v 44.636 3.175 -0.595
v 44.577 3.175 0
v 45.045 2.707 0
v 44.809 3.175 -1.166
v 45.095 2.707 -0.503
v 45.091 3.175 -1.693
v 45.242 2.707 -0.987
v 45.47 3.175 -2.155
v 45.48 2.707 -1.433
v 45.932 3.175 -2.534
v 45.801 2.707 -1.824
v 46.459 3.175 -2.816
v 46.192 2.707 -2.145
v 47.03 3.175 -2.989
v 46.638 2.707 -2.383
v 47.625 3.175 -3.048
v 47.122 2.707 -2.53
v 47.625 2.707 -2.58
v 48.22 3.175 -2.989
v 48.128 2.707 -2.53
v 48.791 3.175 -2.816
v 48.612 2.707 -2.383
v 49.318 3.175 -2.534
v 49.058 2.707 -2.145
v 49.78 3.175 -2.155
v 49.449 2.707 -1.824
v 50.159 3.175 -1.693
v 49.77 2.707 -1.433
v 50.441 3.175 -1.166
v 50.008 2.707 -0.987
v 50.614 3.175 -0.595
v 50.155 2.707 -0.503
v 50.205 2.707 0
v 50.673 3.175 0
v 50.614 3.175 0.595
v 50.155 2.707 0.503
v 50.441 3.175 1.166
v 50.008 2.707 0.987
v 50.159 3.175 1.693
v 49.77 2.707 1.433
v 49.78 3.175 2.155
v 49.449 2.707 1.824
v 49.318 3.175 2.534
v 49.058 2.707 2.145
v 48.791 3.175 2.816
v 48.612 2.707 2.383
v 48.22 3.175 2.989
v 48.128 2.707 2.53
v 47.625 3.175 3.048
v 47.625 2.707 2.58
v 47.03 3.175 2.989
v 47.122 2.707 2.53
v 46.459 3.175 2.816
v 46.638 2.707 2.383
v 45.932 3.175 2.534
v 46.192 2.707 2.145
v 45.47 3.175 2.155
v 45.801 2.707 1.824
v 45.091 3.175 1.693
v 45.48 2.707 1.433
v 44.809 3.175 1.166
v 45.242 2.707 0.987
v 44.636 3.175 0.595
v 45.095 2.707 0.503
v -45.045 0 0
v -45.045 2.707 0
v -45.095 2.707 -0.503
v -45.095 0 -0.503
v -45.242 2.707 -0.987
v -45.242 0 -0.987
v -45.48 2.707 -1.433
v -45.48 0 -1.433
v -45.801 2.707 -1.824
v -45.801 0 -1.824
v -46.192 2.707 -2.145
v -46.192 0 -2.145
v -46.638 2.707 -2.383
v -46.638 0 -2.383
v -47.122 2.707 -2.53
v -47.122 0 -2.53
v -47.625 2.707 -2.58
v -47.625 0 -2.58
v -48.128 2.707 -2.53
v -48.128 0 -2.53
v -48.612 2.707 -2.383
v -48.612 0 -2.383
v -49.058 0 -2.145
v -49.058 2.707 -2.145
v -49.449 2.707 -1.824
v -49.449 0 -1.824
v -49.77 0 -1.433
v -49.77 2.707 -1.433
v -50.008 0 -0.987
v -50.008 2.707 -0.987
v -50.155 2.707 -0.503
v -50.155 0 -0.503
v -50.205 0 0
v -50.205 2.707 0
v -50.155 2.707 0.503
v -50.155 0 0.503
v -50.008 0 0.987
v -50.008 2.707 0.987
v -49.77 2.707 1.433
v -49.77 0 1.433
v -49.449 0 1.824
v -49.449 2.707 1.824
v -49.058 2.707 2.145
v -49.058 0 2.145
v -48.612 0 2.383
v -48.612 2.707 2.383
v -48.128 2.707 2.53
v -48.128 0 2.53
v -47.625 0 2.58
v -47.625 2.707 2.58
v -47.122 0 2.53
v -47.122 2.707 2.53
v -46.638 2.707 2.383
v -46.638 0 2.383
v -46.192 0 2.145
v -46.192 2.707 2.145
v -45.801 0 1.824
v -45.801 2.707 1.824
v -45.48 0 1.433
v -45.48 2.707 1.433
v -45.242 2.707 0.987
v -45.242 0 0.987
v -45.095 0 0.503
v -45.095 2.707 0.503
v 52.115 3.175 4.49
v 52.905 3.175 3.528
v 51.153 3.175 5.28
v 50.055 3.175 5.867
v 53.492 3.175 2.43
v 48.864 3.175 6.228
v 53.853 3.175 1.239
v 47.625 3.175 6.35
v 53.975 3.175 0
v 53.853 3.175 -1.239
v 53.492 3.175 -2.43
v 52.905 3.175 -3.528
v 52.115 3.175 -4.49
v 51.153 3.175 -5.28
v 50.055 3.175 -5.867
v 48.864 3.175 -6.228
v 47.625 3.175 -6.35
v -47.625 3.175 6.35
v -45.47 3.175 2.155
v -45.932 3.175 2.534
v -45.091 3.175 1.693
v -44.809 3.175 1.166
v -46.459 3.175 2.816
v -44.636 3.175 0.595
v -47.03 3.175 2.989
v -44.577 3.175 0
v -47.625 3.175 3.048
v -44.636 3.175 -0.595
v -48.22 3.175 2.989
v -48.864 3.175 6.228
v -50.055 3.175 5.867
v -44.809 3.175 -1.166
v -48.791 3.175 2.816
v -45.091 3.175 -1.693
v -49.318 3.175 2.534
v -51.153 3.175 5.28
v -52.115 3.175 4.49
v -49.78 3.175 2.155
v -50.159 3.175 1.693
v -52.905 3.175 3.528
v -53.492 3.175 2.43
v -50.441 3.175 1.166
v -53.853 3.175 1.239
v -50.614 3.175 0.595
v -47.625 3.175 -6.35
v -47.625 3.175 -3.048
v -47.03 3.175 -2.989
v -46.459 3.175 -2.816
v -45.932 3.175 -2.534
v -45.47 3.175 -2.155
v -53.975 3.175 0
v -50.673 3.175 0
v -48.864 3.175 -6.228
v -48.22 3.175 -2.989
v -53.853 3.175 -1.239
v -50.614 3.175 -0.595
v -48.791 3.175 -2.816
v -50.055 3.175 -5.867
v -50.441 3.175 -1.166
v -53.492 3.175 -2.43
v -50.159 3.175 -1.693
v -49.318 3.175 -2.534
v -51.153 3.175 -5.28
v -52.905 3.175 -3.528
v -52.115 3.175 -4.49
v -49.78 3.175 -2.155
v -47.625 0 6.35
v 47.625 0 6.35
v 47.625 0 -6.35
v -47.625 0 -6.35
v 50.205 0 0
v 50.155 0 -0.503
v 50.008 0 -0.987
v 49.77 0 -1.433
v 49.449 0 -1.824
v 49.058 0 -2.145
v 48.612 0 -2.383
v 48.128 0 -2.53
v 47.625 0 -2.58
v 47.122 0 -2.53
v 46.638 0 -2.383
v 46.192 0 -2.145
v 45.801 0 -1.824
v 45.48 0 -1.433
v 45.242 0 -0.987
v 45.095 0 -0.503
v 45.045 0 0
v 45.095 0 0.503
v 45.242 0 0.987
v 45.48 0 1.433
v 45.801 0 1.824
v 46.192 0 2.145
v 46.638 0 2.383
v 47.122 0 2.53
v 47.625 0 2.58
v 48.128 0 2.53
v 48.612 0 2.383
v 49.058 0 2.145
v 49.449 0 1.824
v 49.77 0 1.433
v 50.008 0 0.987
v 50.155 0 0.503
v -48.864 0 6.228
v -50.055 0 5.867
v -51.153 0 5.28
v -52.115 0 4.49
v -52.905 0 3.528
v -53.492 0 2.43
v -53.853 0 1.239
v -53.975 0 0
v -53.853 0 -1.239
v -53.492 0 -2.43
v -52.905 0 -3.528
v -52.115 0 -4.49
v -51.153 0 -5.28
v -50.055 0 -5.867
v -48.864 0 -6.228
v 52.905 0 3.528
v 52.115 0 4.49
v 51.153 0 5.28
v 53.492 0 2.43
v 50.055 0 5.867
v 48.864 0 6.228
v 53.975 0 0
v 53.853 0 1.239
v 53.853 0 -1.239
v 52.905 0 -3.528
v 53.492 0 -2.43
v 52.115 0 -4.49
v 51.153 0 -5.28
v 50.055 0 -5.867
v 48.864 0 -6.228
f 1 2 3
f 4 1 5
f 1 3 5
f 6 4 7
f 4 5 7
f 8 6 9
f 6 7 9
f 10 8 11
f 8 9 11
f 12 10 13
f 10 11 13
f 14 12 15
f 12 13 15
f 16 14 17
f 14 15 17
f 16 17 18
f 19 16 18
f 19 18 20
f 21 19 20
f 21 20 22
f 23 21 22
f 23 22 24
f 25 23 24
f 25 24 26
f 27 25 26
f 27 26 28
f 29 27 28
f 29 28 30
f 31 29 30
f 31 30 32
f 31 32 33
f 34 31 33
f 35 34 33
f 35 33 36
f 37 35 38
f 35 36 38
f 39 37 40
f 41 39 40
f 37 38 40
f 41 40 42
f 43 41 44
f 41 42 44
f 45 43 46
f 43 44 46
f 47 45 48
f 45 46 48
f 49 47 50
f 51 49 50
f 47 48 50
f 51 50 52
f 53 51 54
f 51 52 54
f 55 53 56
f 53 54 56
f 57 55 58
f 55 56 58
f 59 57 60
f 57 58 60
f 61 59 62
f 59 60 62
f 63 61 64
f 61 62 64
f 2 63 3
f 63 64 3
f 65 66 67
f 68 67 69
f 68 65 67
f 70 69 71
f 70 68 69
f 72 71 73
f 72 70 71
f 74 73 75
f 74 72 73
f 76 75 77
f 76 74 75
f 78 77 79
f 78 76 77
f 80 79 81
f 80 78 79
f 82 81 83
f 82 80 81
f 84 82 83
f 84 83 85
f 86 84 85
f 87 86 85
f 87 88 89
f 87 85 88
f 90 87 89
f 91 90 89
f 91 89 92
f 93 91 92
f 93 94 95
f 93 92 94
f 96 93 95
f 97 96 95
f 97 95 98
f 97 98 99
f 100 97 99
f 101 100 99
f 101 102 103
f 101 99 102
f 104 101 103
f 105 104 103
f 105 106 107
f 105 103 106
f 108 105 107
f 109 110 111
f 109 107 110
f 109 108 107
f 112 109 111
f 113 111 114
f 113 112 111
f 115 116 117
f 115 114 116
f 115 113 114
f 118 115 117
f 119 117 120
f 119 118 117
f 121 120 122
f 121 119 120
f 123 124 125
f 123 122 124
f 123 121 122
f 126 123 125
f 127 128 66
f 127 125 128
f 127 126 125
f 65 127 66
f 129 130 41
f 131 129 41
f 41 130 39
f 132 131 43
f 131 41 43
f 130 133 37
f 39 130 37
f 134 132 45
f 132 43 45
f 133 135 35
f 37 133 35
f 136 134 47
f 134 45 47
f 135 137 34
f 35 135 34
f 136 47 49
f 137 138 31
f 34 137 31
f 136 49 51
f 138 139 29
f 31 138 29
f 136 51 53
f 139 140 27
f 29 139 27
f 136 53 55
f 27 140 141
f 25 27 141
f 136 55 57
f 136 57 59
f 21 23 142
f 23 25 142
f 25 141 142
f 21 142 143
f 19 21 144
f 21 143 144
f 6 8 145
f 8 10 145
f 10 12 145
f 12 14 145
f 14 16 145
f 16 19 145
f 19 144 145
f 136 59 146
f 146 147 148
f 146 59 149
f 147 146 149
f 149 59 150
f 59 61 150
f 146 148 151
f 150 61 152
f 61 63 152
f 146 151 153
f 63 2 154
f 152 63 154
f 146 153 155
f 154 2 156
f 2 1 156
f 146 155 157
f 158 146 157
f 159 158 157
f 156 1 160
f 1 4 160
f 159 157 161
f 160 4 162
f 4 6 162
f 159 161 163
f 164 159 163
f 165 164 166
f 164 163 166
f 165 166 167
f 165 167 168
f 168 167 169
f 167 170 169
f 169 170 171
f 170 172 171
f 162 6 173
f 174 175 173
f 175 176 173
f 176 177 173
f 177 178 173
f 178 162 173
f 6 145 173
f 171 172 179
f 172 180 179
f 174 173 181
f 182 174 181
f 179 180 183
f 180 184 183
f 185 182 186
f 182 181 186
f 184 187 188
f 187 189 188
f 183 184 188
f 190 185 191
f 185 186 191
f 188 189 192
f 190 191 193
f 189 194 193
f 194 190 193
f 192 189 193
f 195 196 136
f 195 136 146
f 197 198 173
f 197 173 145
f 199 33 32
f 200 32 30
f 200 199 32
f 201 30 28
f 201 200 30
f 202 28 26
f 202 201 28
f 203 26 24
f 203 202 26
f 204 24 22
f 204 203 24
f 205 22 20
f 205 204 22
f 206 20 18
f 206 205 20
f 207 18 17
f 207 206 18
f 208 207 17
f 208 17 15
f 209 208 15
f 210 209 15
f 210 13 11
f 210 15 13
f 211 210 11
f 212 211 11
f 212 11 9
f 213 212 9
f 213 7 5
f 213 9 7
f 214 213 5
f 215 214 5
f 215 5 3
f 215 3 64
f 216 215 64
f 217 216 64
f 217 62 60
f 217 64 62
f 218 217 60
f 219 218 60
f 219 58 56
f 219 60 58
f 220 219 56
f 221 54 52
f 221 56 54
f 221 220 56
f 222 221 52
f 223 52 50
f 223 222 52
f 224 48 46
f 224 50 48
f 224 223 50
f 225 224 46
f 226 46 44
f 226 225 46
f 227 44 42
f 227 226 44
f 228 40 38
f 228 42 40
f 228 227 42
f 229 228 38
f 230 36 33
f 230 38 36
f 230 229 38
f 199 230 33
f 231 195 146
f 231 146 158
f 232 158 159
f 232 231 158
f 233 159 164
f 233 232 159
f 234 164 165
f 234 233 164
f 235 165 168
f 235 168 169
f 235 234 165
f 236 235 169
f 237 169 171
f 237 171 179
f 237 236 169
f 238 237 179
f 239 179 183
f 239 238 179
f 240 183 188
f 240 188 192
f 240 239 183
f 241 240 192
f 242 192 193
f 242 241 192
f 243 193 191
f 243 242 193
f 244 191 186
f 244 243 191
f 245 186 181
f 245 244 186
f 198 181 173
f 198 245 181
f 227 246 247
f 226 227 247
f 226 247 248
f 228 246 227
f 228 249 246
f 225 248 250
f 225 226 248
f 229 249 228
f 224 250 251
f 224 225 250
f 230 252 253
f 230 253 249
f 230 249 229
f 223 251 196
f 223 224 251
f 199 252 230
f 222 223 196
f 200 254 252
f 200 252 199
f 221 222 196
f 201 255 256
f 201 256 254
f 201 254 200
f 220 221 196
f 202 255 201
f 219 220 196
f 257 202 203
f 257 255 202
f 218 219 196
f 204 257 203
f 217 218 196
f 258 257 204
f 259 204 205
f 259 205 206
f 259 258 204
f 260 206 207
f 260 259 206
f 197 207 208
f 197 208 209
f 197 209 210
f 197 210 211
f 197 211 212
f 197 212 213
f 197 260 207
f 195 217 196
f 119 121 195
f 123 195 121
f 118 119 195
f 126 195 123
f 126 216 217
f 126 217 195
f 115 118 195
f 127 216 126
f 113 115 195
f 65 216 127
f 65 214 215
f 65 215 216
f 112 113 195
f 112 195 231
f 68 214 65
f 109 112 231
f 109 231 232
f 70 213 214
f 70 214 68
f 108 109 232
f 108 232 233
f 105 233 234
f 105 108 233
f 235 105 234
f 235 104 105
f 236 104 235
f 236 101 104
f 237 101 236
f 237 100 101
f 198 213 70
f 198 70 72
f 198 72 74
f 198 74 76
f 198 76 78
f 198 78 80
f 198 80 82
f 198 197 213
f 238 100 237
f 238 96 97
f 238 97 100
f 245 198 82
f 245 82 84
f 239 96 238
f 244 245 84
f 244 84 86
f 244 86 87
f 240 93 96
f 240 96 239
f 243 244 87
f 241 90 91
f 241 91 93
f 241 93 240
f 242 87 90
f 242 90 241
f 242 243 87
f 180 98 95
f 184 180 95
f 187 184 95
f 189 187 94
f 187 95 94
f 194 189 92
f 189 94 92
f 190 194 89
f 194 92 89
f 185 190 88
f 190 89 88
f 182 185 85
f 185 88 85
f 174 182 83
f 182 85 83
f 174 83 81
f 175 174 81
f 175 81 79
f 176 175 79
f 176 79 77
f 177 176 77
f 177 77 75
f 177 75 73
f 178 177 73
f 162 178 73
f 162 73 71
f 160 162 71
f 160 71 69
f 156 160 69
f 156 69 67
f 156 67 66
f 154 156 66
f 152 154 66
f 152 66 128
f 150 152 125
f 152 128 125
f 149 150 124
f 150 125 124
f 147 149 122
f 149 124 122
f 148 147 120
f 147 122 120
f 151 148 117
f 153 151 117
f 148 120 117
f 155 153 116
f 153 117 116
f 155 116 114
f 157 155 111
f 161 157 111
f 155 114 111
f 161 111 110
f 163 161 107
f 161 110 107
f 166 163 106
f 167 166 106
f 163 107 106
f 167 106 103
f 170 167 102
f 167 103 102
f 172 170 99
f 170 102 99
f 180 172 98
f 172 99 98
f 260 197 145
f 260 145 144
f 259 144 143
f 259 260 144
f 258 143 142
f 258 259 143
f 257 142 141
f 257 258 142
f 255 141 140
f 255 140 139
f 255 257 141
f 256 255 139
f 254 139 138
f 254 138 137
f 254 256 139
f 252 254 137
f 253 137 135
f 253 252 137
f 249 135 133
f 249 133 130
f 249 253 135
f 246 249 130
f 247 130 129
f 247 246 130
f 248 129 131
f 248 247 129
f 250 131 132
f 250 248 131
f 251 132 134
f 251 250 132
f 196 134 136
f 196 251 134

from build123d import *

# Parameters (mm, degrees)
SKETCH1_R                        = 2.5796875
BOSS_EXTRUDE1_DEPTH              = 3.175
F_10_32_TAPPED_HOLE3_D           = 4.0386
F_10_32_TAPPED_HOLE3_CSINK_D     = 6.096
F_10_32_TAPPED_HOLE3_CSINK_ANGLE = 90


with BuildPart() as part:
    # Sketch1 → Boss-Extrude1 (new body)
    with BuildSketch(Plane(origin=(0, 0, 0), x_dir=(1, 0, 0), z_dir=(0, 1, 0))):
        with BuildLine():
            Line((-47.625, 6.35), (47.625, 6.35))
            ThreePointArc((47.625, 6.35), (53.975, 0), (47.625, -6.35))
            Line((47.625, -6.35), (-47.625, -6.35))
            ThreePointArc((-47.625, -6.35), (-53.975, 0), (-47.625, 6.35))
        make_face()
        with Locations((47.625, 0)):
            Circle(SKETCH1_R, mode=Mode.SUBTRACT)
        with Locations((-47.625, 0)):
            Circle(SKETCH1_R, mode=Mode.SUBTRACT)
    extrude(amount=BOSS_EXTRUDE1_DEPTH)

    # #10-32 Tapped Hole3 (through all)
    with Locations(Plane(origin=(0, 3.175, 0), x_dir=(1, 0, 0), z_dir=(0, 1, 0))):
        with Locations((-47.625, 0), (47.625, 0)):
            CounterSinkHole(F_10_32_TAPPED_HOLE3_D / 2, F_10_32_TAPPED_HOLE3_CSINK_D / 2, counter_sink_angle=F_10_32_TAPPED_HOLE3_CSINK_ANGLE)


solid = part.part
